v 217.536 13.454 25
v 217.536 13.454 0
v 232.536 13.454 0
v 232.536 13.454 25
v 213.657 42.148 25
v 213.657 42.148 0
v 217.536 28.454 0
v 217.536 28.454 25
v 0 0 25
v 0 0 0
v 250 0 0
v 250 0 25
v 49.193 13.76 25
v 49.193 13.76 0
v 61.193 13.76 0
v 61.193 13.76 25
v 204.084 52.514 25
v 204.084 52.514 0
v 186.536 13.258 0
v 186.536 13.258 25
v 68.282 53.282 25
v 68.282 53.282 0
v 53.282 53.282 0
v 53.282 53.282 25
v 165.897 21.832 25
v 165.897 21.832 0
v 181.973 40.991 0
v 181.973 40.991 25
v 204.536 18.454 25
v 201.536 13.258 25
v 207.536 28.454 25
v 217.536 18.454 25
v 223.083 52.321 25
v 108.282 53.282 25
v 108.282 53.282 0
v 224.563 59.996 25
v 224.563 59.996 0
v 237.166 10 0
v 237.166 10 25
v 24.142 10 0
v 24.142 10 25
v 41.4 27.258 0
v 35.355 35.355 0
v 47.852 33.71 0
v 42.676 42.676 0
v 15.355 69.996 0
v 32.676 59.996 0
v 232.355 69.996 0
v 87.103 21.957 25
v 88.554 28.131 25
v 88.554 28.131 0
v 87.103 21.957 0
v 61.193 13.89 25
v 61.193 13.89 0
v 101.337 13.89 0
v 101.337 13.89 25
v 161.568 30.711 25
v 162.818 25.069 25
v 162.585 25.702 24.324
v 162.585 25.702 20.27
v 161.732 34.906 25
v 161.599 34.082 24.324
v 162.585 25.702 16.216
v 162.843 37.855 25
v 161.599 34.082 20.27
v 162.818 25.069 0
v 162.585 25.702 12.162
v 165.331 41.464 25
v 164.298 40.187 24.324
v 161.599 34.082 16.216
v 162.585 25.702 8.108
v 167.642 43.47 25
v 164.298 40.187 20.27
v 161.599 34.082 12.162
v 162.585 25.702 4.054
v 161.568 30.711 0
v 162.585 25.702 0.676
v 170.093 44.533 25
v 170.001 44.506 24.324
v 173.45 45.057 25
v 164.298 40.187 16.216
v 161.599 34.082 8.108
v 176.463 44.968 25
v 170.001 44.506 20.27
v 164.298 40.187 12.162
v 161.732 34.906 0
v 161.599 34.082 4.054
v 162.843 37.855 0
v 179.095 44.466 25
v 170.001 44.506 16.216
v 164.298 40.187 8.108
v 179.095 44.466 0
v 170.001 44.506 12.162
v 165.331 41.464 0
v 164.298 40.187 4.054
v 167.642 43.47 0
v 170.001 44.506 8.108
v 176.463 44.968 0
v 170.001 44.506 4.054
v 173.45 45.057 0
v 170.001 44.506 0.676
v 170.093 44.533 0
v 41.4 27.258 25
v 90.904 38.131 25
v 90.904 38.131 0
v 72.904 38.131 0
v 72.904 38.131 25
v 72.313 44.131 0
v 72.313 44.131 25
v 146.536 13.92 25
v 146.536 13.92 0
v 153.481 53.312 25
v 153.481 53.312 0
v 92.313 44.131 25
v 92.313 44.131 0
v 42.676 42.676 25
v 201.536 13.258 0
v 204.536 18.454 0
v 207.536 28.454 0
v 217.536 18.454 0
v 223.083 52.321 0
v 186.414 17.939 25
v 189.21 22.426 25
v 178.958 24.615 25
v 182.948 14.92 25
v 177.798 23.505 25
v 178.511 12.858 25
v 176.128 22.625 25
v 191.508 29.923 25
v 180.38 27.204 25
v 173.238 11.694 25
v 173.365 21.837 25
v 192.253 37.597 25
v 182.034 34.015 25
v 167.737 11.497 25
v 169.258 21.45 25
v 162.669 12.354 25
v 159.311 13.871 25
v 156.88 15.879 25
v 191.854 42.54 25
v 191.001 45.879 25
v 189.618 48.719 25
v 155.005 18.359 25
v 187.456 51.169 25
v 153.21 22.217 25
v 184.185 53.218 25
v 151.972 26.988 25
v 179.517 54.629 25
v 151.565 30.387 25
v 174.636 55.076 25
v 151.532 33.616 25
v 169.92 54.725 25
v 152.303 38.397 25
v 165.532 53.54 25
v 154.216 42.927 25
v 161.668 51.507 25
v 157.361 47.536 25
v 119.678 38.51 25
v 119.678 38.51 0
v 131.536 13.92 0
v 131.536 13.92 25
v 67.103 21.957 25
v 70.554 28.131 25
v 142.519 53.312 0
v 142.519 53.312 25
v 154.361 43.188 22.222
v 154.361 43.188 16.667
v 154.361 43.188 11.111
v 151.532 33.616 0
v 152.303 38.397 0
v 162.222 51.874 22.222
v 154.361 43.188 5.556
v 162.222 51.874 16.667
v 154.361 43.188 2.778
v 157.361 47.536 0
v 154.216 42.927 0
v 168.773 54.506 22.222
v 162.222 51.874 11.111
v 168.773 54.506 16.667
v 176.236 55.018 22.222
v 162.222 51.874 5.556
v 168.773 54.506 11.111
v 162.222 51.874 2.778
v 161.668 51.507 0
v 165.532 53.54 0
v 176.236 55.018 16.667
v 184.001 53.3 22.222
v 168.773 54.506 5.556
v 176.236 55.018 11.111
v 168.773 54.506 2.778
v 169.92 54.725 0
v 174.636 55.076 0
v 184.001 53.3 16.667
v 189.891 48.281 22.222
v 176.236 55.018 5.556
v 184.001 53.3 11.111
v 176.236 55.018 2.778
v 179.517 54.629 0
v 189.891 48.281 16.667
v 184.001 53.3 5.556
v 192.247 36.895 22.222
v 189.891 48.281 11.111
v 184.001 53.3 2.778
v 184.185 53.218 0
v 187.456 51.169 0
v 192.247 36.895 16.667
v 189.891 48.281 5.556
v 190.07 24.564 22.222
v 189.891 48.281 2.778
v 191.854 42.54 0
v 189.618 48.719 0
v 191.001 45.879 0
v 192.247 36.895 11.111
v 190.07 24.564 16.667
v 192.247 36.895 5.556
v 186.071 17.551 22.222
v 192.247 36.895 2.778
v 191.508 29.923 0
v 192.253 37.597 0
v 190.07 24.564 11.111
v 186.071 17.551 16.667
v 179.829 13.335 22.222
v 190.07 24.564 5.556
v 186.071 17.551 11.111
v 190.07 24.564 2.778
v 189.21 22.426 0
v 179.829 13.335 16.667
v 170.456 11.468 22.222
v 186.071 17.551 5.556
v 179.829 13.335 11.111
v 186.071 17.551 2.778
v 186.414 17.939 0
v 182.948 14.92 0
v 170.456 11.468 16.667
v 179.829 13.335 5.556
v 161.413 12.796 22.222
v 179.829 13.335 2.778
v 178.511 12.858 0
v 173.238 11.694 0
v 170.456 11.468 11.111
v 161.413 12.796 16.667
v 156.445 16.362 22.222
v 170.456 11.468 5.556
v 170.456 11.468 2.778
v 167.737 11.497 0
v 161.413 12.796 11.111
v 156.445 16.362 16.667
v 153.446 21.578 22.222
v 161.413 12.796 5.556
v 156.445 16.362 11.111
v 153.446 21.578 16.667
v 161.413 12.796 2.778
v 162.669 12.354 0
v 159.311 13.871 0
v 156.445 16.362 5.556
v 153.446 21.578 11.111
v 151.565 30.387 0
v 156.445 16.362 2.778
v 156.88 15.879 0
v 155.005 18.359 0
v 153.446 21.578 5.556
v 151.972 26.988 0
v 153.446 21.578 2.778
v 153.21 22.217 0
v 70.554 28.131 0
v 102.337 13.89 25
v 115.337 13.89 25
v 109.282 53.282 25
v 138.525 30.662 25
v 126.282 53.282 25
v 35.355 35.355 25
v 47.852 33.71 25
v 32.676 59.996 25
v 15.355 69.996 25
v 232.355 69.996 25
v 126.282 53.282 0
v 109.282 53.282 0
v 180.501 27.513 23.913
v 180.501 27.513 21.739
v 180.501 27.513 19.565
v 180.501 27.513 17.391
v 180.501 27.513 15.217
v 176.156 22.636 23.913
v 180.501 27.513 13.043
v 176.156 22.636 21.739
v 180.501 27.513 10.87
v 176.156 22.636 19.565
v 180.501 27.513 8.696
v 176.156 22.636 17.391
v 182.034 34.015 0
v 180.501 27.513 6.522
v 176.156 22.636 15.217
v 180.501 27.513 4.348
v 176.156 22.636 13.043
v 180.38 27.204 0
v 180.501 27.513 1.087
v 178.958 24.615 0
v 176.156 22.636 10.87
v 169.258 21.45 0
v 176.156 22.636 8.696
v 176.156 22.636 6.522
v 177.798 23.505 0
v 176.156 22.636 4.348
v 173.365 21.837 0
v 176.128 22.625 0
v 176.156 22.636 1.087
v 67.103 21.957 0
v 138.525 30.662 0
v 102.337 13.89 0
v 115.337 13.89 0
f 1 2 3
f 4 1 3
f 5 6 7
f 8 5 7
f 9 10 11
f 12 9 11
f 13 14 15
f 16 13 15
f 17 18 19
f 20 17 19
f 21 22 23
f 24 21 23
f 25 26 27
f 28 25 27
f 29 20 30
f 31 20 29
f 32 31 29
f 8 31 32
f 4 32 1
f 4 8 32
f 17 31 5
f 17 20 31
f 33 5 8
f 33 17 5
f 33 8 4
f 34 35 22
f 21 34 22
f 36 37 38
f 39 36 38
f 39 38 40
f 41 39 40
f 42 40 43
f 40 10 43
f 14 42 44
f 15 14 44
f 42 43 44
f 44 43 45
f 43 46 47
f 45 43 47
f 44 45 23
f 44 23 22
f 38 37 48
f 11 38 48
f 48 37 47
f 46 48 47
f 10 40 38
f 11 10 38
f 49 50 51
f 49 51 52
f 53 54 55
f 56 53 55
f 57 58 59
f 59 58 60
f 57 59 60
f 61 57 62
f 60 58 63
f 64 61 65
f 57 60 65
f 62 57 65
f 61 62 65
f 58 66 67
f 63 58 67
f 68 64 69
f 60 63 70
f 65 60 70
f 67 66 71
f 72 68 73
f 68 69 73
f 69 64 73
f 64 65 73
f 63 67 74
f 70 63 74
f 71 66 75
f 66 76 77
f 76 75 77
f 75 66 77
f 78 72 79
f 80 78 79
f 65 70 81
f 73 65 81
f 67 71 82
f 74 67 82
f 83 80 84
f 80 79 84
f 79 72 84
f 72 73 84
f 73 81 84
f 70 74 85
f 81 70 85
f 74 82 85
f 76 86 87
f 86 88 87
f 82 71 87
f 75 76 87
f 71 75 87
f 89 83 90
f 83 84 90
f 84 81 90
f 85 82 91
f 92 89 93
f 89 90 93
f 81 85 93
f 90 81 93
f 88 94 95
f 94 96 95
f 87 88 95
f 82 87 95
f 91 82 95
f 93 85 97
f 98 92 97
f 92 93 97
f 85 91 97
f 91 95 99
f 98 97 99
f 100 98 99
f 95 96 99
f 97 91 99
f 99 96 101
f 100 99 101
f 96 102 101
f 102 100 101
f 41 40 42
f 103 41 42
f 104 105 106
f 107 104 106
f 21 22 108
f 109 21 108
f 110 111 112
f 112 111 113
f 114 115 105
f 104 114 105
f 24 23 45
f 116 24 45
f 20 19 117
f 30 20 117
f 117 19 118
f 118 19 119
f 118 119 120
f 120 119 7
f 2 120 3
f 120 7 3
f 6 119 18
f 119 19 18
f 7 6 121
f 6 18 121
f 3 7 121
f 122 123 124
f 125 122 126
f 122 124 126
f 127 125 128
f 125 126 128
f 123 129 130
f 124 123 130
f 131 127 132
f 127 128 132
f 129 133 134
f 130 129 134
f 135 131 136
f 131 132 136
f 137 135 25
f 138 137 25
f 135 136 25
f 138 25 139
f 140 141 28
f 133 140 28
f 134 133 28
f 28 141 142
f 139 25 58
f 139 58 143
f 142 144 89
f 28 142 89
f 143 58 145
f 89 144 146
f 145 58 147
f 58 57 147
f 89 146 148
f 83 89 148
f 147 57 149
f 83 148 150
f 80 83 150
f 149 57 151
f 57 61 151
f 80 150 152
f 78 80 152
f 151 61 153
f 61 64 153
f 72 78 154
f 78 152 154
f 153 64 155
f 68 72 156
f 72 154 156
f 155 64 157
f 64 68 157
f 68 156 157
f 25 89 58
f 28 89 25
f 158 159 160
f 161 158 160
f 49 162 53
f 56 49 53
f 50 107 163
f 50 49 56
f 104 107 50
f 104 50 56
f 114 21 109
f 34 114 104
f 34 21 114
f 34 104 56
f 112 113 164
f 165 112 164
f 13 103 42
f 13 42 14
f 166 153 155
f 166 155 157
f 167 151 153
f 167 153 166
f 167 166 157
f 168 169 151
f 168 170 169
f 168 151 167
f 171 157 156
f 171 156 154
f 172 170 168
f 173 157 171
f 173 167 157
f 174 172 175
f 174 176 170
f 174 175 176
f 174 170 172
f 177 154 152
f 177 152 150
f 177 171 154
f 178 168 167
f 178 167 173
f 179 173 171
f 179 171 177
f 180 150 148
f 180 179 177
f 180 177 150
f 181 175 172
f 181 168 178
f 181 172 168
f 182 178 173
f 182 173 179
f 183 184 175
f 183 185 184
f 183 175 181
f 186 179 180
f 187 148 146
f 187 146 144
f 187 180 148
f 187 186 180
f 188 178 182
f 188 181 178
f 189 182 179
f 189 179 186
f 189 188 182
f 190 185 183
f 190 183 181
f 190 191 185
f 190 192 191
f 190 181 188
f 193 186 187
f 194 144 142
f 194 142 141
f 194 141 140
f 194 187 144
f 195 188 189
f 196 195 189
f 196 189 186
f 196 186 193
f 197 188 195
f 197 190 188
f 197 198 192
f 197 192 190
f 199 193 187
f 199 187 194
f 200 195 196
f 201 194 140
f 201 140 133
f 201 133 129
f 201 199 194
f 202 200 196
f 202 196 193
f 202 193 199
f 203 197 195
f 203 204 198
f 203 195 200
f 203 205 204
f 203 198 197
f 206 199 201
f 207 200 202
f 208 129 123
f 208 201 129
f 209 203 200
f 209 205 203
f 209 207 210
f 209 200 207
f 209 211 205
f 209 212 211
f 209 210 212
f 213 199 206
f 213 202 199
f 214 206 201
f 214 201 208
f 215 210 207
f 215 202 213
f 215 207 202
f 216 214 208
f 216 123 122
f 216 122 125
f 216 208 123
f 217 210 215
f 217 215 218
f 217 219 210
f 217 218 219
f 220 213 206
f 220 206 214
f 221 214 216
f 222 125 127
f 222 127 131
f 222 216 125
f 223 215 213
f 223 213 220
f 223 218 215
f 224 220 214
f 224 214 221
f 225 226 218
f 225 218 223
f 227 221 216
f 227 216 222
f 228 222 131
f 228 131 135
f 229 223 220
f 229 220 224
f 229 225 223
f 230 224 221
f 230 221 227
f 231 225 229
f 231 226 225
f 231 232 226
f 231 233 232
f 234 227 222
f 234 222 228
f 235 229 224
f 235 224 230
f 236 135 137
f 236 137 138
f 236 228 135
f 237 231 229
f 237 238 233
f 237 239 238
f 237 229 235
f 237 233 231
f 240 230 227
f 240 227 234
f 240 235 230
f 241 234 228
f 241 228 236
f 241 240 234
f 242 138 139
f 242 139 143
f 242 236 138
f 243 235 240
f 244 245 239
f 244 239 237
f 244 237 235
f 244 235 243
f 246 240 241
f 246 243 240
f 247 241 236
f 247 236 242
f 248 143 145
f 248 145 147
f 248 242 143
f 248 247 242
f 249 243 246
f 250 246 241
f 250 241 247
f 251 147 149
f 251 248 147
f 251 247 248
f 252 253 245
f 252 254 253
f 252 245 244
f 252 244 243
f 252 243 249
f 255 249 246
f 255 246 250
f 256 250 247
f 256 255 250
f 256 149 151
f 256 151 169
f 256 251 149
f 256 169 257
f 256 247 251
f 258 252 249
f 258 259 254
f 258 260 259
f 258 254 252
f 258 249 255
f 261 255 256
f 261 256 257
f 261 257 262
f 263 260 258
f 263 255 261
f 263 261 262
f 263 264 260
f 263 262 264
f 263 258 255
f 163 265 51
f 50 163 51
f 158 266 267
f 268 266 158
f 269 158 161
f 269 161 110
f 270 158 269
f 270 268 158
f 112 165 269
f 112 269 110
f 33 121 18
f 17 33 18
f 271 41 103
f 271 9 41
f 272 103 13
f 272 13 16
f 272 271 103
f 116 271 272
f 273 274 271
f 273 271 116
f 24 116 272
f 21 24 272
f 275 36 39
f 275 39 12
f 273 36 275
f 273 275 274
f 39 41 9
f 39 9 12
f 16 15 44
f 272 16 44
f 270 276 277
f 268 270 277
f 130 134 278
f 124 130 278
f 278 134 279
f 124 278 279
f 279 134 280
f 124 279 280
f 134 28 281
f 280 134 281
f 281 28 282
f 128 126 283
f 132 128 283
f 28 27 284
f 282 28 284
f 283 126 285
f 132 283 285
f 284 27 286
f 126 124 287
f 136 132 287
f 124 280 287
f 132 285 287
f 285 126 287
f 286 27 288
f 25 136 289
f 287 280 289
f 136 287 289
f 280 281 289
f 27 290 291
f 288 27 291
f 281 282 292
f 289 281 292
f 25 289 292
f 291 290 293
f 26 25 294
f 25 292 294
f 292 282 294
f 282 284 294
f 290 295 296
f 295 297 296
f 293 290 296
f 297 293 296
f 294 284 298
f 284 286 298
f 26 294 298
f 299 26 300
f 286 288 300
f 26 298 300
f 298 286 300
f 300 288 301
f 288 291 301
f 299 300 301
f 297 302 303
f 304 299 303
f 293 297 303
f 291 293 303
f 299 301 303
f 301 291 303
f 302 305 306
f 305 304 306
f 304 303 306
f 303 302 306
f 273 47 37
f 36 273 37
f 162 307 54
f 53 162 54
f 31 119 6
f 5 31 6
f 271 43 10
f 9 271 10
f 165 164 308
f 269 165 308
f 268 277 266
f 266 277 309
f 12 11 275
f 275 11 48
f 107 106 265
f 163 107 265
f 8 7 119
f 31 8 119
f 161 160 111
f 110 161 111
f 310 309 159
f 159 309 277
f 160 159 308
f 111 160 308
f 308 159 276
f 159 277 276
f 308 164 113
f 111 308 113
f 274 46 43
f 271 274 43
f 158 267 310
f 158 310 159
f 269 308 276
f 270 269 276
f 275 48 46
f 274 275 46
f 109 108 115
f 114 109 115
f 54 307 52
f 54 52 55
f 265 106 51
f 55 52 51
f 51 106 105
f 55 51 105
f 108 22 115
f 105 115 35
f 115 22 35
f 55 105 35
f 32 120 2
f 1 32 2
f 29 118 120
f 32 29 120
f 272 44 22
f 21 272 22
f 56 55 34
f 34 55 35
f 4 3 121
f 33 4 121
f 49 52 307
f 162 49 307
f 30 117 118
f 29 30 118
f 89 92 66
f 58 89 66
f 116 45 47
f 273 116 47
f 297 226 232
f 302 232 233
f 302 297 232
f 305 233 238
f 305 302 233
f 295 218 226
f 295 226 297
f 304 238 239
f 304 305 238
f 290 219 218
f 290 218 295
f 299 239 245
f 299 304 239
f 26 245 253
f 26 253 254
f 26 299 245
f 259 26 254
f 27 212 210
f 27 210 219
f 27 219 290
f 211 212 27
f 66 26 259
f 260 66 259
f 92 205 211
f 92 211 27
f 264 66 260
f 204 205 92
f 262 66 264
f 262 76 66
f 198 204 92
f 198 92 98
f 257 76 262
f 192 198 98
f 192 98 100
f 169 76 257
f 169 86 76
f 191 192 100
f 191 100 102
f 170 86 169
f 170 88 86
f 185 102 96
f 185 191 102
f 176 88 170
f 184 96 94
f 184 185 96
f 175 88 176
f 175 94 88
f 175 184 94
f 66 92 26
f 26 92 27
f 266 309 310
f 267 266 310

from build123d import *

# Parameters (mm, degrees)
F1_DEPTH = 25


# Not quite as in the source:
# - ends of sketch curves that miss each other by under 0.0002 mm in the source are joined
# - the dataset's text gives a spline's control points without its knots; the knots are read off the source's solid
# - a feature names something its author has since deleted; it is built from what else it names


with BuildPart() as f1:
    # F0 (on Top) → F1 (new body)
    with BuildSketch(Plane.XY):
        Polygon((35.3553390593, 35.3553390593), (0, 0), (250, 0), (232.3553390593, 69.9963552107), (15.3553390593, 69.9963552107), align=None)
        Polygon((32.6758509431, 59.9963530121), (224.56330661, 59.9963530121), (237.166372237, 10.0000021986), (24.1421409317, 10.0000021986), (41.4001874912, 27.2580487582), (47.8522307846, 33.7100920516), (42.6758487445, 42.6758487445), align=None, mode=Mode.SUBTRACT)
        Polygon((53.2824504623, 53.2824504623), (42.6758487445, 42.6758487445), (47.8522307846, 33.7100920516), (68.2824504623, 53.2824504623), align=None)
        Polygon((47.8522307846, 33.7100920516), (41.4001874912, 27.2580487582), (49.1933937334, 13.7598195929), (61.1933937334, 13.7598195929), align=None)
    extrude(amount=F1_DEPTH)


with BuildPart() as f1b:
    # F0 (on Top) → F1, piece 2 (new body)
    with BuildSketch(Plane.XY):
        Polygon((88.5540837341, 28.1308456181), (90.9036234209, 38.1308456181), (72.9036234209, 38.1308456181), (70.5540837341, 28.1308456181), align=None)
        Polygon((108.2824504623, 53.2824504623), (68.2824504623, 53.2824504623), (72.313347233, 44.1308456181), (92.313347233, 44.1308456181), (90.9036234209, 38.1308456181), (88.5540837341, 28.1308456181), (87.1034676285, 21.9568017674), (67.1034676285, 21.9568017674), (61.1933937334, 13.8901403418), (101.3365233556, 13.8901403418), align=None)
    extrude(amount=F1_DEPTH)


with BuildPart() as f1c:
    # F0 (on Top) → F1, piece 3 (new body)
    with BuildSketch(Plane.XY):
        Polygon((126.2824504623, 53.2824504623), (109.2824504623, 53.2824504623), (102.3365233556, 13.8901403418), (115.3365233556, 13.8901403418), (119.6777277973, 38.5103341671), (131.5355133201, 13.9200327762), (146.5355133201, 13.9200327762), (153.4814404268, 53.3123428967), (142.5191015005, 53.3123428967), (138.5251934142, 30.6617645774), align=None)
    extrude(amount=F1_DEPTH)


with BuildPart() as f1d:
    # F0 (on Top) → F1, piece 4 (new body)
    with BuildSketch(Plane.XY):
        with BuildLine():
            add(Edge.make_bspline(
                [(151.5315026045, 33.6161878365), (151.6881953051, 36.8603511522), (153.3257449913, 42.6794005447), (161.5552143615, 53.4867465492), (176.1548241084, 56.3217499328), (194.0088877696, 50.9134823684), (191.9976885112, 23.1984608195), (181.36266293, 11.4878216907), (160.3055787763, 10.4275817806), (152.5823075504, 20.9096175793), (151.3494491195, 29.8469552222), (151.5315026045, 33.6161878365)],
                knots=[0, 0, 0, 0, 0.0883183193, 0.1917010674, 0.3023367007, 0.4162516271, 0.5584218951, 0.6722296295, 0.7975352428, 0.8973873208, 1, 1, 1, 1], degree=3))
        make_face()
        with BuildLine():
            add(Edge.make_bspline(
                [(162.8184250503, 25.0692523461), (162.7388528349, 25.2709199434), (162.5250729743, 25.8491123795), (162.2111113791, 26.8772771924), (161.811446171, 28.5859325459), (161.5680124914, 30.3698864013), (161.490617043, 32.0313577817), (161.5032118997, 32.7877081125), (161.5198585813, 33.1337514359)],
                knots=[0.8971962129, 0.8971962129, 0.8971962129, 0.8971962129, 0.90625, 0.921875, 0.9375, 0.96875, 0.984375, 1, 1, 1, 1], degree=3))
            add(Edge.make_bspline(
                [(161.5198585813, 33.1337514359), (161.5365052629, 33.4797947593), (161.5904971328, 34.1076177221), (161.7198338174, 34.8971109654), (161.8983772283, 35.617959176), (162.1037900469, 36.2305480911), (162.3191108206, 36.7643620724), (162.5109148317, 37.1933987719), (162.7379267984, 37.6574642255), (163.0921353714, 38.326605495), (163.596210236, 39.1811127594), (164.287470415, 40.1970519056), (165.0414513207, 41.1551577869), (165.8327231283, 42.017135319), (166.4983498938, 42.6285934344), (167.0176778213, 43.0428000772), (167.3981141086, 43.3156806379), (167.7595288983, 43.5467960735), (168.1488651256, 43.766963423), (168.5654607343, 43.9738592368), (169.1603655772, 44.23185257), (169.9804869671, 44.5178805652), (171.0896341478, 44.7915612101), (172.3184150489, 44.9834054828), (173.6559028444, 45.0826399089), (174.7295299917, 45.0813201083), (175.4692709806, 45.0471315589), (175.9685909899, 45.0153875781), (176.5764482855, 44.960404607), (177.2752413398, 44.8700053931), (178.152789541, 44.7188709988), (178.7412145092, 44.5732668808), (179.0910574906, 44.4674492213), (179.0945257888, 44.4663980322)],
                knots=[0, 0, 0, 0, 0.015625, 0.03125, 0.046875, 0.0625, 0.0703125, 0.078125, 0.0859375, 0.09375, 0.109375, 0.125, 0.140625, 0.15625, 0.171875, 0.1796875, 0.1875, 0.1953125, 0.203125, 0.2109375, 0.21875, 0.234375, 0.25, 0.265625, 0.28125, 0.296875, 0.30078125, 0.3046875, 0.3125, 0.3203125, 0.328125, 0.34375, 0.3439066519, 0.3439066519, 0.3439066519, 0.3439066519], degree=3))
            add(Edge.make_bspline(
                [(179.0945257888, 44.4663980322), (179.4369974189, 44.3626000224), (180.0408289592, 44.137858269), (180.6603332198, 43.8043498556), (180.954614815, 43.5775919437), (181.1038370269, 43.4315691806), (181.1895827034, 43.3310307887), (181.2538264485, 43.2395291398), (181.3046724038, 43.1550069204), (181.3582155541, 43.05569095), (181.422796919, 42.9212624239), (181.5199173994, 42.6948431225), (181.7085595453, 42.1772024114), (181.8753089955, 41.5231873988), (181.9696544415, 41.0096622148), (181.9730783847, 40.9907957298)],
                knots=[0.3439066519, 0.3439066519, 0.3439066519, 0.3439066519, 0.359375, 0.375, 0.390625, 0.3984375, 0.40625, 0.4140625, 0.41796875, 0.421875, 0.42578125, 0.4296875, 0.4375, 0.453125, 0.4537178211, 0.4537178211, 0.4537178211, 0.4537178211], degree=3))
            add(Edge.make_bspline(
                [(181.9730783847, 40.9907957298), (182.0598994005, 40.512397778), (182.2045363428, 39.41183358), (182.2797979507, 37.4823107399), (182.193566141, 35.3678582229), (181.9493626032, 33.2017921364), (181.5644163989, 31.0887847577), (181.0667847965, 29.1323622869), (180.5011449009, 27.4494312491), (179.9317447836, 26.1476864655), (179.3824865747, 25.1785905134), (178.8685398921, 24.4779841747), (178.3709172748, 23.9520794031), (177.8264944089, 23.5060953751), (177.1374617731, 23.0738355235), (176.2112022482, 22.6358864412), (174.9558716393, 22.2007569681), (173.4559950281, 21.8323747048), (171.8198374216, 21.5722282716), (170.1442177268, 21.4412866926), (168.5280439261, 21.4466193999), (167.3160139795, 21.558065936), (166.4822451641, 21.6958640201), (166.0986472535, 21.7808626756), (165.9163137021, 21.8272428827), (165.8971010414, 21.8322026836)],
                knots=[0.4537178211, 0.4537178211, 0.4537178211, 0.4537178211, 0.46875, 0.484375, 0.5, 0.515625, 0.53125, 0.546875, 0.5625, 0.578125, 0.59375, 0.609375, 0.625, 0.640625, 0.65625, 0.671875, 0.6875, 0.703125, 0.71875, 0.734375, 0.75, 0.765625, 0.7734375, 0.78125, 0.7821827292, 0.7821827292, 0.7821827292, 0.7821827292], degree=3))
            add(Edge.make_bspline(
                [(165.8971010414, 21.8322026836), (165.7553892759, 21.868785963), (165.5531970067, 21.9272567748), (165.3254056153, 22.0041417656), (165.1739060305, 22.0612615773), (165.0494707627, 22.1134592968), (164.8977695401, 22.1837784003), (164.7376634219, 22.2699020236), (164.5740601511, 22.3743238889), (164.3757102389, 22.5229923761), (164.1329229874, 22.7478764528), (163.795317607, 23.1578632169), (163.4078371213, 23.7696356085), (163.0732924198, 24.4470716455), (162.8761783378, 24.9228825776), (162.8184250503, 25.0692523461)],
                knots=[0.7821827292, 0.7821827292, 0.7821827292, 0.7821827292, 0.7890625, 0.79296875, 0.796875, 0.80078125, 0.8046875, 0.8125, 0.8203125, 0.828125, 0.84375, 0.859375, 0.875, 0.890625, 0.8971962129, 0.8971962129, 0.8971962129, 0.8971962129], degree=3))
        make_face(mode=Mode.SUBTRACT)
        with BuildLine():
            add(Edge.make_bspline(
                [(179.0945257888, 44.4663980322), (179.4369974189, 44.3626000224), (180.0408289592, 44.137858269), (180.6603332198, 43.8043498556), (180.954614815, 43.5775919437), (181.1038370269, 43.4315691806), (181.1895827034, 43.3310307887), (181.2538264485, 43.2395291398), (181.3046724038, 43.1550069204), (181.3582155541, 43.05569095), (181.422796919, 42.9212624239), (181.5199173994, 42.6948431225), (181.7085595453, 42.1772024114), (181.8753089955, 41.5231873988), (181.9696544415, 41.0096622148), (181.9730783847, 40.9907957298)],
                knots=[0.3439066519, 0.3439066519, 0.3439066519, 0.3439066519, 0.359375, 0.375, 0.390625, 0.3984375, 0.40625, 0.4140625, 0.41796875, 0.421875, 0.42578125, 0.4296875, 0.4375, 0.453125, 0.4537178211, 0.4537178211, 0.4537178211, 0.4537178211], degree=3))
            Line((179.0945257888, 44.4663980322), (162.8183697977, 25.0692305451))
            add(Edge.make_bspline(
                [(165.8971010414, 21.8322026836), (165.7553892759, 21.868785963), (165.5531970067, 21.9272567748), (165.3254056153, 22.0041417656), (165.1739060305, 22.0612615773), (165.0494707627, 22.1134592968), (164.8977695401, 22.1837784003), (164.7376634219, 22.2699020236), (164.5740601511, 22.3743238889), (164.3757102389, 22.5229923761), (164.1329229874, 22.7478764528), (163.795317607, 23.1578632169), (163.4078371213, 23.7696356085), (163.0732924198, 24.4470716455), (162.8761783378, 24.9228825776), (162.8183697977, 25.0692305451)],
                knots=[0.7821827292, 0.7821827292, 0.7821827292, 0.7821827292, 0.7890625, 0.79296875, 0.796875, 0.80078125, 0.8046875, 0.8125, 0.8203125, 0.828125, 0.84375, 0.859375, 0.875, 0.890625, 0.8971962129, 0.8971962129, 0.8971962129, 0.8971962129], degree=3))
            Line((165.8971010414, 21.8322026836), (181.9730783847, 40.9907957298))
        make_face()
    extrude(amount=F1_DEPTH)


with BuildPart() as f1e:
    # F0 (on Top) → F1, piece 5 (new body)
    with BuildSketch(Plane.XY):
        Polygon((232.5355133201, 13.4541621667), (223.0829559751, 52.321232543), (204.0839364723, 52.5142556785), (186.5355133201, 13.258009744), (201.5355133201, 13.258009744), (204.5355133201, 18.4541621667), (217.5355133201, 18.4541621667), (217.5355133201, 13.4541621667), align=None)
        Polygon((213.6570562804, 42.148201446), (217.5355133201, 28.4541621667), (207.5355133201, 28.4541621667), align=None, mode=Mode.SUBTRACT)
    extrude(amount=F1_DEPTH)


solid = Compound([f1.part, f1b.part, f1c.part, f1d.part, f1e.part])
